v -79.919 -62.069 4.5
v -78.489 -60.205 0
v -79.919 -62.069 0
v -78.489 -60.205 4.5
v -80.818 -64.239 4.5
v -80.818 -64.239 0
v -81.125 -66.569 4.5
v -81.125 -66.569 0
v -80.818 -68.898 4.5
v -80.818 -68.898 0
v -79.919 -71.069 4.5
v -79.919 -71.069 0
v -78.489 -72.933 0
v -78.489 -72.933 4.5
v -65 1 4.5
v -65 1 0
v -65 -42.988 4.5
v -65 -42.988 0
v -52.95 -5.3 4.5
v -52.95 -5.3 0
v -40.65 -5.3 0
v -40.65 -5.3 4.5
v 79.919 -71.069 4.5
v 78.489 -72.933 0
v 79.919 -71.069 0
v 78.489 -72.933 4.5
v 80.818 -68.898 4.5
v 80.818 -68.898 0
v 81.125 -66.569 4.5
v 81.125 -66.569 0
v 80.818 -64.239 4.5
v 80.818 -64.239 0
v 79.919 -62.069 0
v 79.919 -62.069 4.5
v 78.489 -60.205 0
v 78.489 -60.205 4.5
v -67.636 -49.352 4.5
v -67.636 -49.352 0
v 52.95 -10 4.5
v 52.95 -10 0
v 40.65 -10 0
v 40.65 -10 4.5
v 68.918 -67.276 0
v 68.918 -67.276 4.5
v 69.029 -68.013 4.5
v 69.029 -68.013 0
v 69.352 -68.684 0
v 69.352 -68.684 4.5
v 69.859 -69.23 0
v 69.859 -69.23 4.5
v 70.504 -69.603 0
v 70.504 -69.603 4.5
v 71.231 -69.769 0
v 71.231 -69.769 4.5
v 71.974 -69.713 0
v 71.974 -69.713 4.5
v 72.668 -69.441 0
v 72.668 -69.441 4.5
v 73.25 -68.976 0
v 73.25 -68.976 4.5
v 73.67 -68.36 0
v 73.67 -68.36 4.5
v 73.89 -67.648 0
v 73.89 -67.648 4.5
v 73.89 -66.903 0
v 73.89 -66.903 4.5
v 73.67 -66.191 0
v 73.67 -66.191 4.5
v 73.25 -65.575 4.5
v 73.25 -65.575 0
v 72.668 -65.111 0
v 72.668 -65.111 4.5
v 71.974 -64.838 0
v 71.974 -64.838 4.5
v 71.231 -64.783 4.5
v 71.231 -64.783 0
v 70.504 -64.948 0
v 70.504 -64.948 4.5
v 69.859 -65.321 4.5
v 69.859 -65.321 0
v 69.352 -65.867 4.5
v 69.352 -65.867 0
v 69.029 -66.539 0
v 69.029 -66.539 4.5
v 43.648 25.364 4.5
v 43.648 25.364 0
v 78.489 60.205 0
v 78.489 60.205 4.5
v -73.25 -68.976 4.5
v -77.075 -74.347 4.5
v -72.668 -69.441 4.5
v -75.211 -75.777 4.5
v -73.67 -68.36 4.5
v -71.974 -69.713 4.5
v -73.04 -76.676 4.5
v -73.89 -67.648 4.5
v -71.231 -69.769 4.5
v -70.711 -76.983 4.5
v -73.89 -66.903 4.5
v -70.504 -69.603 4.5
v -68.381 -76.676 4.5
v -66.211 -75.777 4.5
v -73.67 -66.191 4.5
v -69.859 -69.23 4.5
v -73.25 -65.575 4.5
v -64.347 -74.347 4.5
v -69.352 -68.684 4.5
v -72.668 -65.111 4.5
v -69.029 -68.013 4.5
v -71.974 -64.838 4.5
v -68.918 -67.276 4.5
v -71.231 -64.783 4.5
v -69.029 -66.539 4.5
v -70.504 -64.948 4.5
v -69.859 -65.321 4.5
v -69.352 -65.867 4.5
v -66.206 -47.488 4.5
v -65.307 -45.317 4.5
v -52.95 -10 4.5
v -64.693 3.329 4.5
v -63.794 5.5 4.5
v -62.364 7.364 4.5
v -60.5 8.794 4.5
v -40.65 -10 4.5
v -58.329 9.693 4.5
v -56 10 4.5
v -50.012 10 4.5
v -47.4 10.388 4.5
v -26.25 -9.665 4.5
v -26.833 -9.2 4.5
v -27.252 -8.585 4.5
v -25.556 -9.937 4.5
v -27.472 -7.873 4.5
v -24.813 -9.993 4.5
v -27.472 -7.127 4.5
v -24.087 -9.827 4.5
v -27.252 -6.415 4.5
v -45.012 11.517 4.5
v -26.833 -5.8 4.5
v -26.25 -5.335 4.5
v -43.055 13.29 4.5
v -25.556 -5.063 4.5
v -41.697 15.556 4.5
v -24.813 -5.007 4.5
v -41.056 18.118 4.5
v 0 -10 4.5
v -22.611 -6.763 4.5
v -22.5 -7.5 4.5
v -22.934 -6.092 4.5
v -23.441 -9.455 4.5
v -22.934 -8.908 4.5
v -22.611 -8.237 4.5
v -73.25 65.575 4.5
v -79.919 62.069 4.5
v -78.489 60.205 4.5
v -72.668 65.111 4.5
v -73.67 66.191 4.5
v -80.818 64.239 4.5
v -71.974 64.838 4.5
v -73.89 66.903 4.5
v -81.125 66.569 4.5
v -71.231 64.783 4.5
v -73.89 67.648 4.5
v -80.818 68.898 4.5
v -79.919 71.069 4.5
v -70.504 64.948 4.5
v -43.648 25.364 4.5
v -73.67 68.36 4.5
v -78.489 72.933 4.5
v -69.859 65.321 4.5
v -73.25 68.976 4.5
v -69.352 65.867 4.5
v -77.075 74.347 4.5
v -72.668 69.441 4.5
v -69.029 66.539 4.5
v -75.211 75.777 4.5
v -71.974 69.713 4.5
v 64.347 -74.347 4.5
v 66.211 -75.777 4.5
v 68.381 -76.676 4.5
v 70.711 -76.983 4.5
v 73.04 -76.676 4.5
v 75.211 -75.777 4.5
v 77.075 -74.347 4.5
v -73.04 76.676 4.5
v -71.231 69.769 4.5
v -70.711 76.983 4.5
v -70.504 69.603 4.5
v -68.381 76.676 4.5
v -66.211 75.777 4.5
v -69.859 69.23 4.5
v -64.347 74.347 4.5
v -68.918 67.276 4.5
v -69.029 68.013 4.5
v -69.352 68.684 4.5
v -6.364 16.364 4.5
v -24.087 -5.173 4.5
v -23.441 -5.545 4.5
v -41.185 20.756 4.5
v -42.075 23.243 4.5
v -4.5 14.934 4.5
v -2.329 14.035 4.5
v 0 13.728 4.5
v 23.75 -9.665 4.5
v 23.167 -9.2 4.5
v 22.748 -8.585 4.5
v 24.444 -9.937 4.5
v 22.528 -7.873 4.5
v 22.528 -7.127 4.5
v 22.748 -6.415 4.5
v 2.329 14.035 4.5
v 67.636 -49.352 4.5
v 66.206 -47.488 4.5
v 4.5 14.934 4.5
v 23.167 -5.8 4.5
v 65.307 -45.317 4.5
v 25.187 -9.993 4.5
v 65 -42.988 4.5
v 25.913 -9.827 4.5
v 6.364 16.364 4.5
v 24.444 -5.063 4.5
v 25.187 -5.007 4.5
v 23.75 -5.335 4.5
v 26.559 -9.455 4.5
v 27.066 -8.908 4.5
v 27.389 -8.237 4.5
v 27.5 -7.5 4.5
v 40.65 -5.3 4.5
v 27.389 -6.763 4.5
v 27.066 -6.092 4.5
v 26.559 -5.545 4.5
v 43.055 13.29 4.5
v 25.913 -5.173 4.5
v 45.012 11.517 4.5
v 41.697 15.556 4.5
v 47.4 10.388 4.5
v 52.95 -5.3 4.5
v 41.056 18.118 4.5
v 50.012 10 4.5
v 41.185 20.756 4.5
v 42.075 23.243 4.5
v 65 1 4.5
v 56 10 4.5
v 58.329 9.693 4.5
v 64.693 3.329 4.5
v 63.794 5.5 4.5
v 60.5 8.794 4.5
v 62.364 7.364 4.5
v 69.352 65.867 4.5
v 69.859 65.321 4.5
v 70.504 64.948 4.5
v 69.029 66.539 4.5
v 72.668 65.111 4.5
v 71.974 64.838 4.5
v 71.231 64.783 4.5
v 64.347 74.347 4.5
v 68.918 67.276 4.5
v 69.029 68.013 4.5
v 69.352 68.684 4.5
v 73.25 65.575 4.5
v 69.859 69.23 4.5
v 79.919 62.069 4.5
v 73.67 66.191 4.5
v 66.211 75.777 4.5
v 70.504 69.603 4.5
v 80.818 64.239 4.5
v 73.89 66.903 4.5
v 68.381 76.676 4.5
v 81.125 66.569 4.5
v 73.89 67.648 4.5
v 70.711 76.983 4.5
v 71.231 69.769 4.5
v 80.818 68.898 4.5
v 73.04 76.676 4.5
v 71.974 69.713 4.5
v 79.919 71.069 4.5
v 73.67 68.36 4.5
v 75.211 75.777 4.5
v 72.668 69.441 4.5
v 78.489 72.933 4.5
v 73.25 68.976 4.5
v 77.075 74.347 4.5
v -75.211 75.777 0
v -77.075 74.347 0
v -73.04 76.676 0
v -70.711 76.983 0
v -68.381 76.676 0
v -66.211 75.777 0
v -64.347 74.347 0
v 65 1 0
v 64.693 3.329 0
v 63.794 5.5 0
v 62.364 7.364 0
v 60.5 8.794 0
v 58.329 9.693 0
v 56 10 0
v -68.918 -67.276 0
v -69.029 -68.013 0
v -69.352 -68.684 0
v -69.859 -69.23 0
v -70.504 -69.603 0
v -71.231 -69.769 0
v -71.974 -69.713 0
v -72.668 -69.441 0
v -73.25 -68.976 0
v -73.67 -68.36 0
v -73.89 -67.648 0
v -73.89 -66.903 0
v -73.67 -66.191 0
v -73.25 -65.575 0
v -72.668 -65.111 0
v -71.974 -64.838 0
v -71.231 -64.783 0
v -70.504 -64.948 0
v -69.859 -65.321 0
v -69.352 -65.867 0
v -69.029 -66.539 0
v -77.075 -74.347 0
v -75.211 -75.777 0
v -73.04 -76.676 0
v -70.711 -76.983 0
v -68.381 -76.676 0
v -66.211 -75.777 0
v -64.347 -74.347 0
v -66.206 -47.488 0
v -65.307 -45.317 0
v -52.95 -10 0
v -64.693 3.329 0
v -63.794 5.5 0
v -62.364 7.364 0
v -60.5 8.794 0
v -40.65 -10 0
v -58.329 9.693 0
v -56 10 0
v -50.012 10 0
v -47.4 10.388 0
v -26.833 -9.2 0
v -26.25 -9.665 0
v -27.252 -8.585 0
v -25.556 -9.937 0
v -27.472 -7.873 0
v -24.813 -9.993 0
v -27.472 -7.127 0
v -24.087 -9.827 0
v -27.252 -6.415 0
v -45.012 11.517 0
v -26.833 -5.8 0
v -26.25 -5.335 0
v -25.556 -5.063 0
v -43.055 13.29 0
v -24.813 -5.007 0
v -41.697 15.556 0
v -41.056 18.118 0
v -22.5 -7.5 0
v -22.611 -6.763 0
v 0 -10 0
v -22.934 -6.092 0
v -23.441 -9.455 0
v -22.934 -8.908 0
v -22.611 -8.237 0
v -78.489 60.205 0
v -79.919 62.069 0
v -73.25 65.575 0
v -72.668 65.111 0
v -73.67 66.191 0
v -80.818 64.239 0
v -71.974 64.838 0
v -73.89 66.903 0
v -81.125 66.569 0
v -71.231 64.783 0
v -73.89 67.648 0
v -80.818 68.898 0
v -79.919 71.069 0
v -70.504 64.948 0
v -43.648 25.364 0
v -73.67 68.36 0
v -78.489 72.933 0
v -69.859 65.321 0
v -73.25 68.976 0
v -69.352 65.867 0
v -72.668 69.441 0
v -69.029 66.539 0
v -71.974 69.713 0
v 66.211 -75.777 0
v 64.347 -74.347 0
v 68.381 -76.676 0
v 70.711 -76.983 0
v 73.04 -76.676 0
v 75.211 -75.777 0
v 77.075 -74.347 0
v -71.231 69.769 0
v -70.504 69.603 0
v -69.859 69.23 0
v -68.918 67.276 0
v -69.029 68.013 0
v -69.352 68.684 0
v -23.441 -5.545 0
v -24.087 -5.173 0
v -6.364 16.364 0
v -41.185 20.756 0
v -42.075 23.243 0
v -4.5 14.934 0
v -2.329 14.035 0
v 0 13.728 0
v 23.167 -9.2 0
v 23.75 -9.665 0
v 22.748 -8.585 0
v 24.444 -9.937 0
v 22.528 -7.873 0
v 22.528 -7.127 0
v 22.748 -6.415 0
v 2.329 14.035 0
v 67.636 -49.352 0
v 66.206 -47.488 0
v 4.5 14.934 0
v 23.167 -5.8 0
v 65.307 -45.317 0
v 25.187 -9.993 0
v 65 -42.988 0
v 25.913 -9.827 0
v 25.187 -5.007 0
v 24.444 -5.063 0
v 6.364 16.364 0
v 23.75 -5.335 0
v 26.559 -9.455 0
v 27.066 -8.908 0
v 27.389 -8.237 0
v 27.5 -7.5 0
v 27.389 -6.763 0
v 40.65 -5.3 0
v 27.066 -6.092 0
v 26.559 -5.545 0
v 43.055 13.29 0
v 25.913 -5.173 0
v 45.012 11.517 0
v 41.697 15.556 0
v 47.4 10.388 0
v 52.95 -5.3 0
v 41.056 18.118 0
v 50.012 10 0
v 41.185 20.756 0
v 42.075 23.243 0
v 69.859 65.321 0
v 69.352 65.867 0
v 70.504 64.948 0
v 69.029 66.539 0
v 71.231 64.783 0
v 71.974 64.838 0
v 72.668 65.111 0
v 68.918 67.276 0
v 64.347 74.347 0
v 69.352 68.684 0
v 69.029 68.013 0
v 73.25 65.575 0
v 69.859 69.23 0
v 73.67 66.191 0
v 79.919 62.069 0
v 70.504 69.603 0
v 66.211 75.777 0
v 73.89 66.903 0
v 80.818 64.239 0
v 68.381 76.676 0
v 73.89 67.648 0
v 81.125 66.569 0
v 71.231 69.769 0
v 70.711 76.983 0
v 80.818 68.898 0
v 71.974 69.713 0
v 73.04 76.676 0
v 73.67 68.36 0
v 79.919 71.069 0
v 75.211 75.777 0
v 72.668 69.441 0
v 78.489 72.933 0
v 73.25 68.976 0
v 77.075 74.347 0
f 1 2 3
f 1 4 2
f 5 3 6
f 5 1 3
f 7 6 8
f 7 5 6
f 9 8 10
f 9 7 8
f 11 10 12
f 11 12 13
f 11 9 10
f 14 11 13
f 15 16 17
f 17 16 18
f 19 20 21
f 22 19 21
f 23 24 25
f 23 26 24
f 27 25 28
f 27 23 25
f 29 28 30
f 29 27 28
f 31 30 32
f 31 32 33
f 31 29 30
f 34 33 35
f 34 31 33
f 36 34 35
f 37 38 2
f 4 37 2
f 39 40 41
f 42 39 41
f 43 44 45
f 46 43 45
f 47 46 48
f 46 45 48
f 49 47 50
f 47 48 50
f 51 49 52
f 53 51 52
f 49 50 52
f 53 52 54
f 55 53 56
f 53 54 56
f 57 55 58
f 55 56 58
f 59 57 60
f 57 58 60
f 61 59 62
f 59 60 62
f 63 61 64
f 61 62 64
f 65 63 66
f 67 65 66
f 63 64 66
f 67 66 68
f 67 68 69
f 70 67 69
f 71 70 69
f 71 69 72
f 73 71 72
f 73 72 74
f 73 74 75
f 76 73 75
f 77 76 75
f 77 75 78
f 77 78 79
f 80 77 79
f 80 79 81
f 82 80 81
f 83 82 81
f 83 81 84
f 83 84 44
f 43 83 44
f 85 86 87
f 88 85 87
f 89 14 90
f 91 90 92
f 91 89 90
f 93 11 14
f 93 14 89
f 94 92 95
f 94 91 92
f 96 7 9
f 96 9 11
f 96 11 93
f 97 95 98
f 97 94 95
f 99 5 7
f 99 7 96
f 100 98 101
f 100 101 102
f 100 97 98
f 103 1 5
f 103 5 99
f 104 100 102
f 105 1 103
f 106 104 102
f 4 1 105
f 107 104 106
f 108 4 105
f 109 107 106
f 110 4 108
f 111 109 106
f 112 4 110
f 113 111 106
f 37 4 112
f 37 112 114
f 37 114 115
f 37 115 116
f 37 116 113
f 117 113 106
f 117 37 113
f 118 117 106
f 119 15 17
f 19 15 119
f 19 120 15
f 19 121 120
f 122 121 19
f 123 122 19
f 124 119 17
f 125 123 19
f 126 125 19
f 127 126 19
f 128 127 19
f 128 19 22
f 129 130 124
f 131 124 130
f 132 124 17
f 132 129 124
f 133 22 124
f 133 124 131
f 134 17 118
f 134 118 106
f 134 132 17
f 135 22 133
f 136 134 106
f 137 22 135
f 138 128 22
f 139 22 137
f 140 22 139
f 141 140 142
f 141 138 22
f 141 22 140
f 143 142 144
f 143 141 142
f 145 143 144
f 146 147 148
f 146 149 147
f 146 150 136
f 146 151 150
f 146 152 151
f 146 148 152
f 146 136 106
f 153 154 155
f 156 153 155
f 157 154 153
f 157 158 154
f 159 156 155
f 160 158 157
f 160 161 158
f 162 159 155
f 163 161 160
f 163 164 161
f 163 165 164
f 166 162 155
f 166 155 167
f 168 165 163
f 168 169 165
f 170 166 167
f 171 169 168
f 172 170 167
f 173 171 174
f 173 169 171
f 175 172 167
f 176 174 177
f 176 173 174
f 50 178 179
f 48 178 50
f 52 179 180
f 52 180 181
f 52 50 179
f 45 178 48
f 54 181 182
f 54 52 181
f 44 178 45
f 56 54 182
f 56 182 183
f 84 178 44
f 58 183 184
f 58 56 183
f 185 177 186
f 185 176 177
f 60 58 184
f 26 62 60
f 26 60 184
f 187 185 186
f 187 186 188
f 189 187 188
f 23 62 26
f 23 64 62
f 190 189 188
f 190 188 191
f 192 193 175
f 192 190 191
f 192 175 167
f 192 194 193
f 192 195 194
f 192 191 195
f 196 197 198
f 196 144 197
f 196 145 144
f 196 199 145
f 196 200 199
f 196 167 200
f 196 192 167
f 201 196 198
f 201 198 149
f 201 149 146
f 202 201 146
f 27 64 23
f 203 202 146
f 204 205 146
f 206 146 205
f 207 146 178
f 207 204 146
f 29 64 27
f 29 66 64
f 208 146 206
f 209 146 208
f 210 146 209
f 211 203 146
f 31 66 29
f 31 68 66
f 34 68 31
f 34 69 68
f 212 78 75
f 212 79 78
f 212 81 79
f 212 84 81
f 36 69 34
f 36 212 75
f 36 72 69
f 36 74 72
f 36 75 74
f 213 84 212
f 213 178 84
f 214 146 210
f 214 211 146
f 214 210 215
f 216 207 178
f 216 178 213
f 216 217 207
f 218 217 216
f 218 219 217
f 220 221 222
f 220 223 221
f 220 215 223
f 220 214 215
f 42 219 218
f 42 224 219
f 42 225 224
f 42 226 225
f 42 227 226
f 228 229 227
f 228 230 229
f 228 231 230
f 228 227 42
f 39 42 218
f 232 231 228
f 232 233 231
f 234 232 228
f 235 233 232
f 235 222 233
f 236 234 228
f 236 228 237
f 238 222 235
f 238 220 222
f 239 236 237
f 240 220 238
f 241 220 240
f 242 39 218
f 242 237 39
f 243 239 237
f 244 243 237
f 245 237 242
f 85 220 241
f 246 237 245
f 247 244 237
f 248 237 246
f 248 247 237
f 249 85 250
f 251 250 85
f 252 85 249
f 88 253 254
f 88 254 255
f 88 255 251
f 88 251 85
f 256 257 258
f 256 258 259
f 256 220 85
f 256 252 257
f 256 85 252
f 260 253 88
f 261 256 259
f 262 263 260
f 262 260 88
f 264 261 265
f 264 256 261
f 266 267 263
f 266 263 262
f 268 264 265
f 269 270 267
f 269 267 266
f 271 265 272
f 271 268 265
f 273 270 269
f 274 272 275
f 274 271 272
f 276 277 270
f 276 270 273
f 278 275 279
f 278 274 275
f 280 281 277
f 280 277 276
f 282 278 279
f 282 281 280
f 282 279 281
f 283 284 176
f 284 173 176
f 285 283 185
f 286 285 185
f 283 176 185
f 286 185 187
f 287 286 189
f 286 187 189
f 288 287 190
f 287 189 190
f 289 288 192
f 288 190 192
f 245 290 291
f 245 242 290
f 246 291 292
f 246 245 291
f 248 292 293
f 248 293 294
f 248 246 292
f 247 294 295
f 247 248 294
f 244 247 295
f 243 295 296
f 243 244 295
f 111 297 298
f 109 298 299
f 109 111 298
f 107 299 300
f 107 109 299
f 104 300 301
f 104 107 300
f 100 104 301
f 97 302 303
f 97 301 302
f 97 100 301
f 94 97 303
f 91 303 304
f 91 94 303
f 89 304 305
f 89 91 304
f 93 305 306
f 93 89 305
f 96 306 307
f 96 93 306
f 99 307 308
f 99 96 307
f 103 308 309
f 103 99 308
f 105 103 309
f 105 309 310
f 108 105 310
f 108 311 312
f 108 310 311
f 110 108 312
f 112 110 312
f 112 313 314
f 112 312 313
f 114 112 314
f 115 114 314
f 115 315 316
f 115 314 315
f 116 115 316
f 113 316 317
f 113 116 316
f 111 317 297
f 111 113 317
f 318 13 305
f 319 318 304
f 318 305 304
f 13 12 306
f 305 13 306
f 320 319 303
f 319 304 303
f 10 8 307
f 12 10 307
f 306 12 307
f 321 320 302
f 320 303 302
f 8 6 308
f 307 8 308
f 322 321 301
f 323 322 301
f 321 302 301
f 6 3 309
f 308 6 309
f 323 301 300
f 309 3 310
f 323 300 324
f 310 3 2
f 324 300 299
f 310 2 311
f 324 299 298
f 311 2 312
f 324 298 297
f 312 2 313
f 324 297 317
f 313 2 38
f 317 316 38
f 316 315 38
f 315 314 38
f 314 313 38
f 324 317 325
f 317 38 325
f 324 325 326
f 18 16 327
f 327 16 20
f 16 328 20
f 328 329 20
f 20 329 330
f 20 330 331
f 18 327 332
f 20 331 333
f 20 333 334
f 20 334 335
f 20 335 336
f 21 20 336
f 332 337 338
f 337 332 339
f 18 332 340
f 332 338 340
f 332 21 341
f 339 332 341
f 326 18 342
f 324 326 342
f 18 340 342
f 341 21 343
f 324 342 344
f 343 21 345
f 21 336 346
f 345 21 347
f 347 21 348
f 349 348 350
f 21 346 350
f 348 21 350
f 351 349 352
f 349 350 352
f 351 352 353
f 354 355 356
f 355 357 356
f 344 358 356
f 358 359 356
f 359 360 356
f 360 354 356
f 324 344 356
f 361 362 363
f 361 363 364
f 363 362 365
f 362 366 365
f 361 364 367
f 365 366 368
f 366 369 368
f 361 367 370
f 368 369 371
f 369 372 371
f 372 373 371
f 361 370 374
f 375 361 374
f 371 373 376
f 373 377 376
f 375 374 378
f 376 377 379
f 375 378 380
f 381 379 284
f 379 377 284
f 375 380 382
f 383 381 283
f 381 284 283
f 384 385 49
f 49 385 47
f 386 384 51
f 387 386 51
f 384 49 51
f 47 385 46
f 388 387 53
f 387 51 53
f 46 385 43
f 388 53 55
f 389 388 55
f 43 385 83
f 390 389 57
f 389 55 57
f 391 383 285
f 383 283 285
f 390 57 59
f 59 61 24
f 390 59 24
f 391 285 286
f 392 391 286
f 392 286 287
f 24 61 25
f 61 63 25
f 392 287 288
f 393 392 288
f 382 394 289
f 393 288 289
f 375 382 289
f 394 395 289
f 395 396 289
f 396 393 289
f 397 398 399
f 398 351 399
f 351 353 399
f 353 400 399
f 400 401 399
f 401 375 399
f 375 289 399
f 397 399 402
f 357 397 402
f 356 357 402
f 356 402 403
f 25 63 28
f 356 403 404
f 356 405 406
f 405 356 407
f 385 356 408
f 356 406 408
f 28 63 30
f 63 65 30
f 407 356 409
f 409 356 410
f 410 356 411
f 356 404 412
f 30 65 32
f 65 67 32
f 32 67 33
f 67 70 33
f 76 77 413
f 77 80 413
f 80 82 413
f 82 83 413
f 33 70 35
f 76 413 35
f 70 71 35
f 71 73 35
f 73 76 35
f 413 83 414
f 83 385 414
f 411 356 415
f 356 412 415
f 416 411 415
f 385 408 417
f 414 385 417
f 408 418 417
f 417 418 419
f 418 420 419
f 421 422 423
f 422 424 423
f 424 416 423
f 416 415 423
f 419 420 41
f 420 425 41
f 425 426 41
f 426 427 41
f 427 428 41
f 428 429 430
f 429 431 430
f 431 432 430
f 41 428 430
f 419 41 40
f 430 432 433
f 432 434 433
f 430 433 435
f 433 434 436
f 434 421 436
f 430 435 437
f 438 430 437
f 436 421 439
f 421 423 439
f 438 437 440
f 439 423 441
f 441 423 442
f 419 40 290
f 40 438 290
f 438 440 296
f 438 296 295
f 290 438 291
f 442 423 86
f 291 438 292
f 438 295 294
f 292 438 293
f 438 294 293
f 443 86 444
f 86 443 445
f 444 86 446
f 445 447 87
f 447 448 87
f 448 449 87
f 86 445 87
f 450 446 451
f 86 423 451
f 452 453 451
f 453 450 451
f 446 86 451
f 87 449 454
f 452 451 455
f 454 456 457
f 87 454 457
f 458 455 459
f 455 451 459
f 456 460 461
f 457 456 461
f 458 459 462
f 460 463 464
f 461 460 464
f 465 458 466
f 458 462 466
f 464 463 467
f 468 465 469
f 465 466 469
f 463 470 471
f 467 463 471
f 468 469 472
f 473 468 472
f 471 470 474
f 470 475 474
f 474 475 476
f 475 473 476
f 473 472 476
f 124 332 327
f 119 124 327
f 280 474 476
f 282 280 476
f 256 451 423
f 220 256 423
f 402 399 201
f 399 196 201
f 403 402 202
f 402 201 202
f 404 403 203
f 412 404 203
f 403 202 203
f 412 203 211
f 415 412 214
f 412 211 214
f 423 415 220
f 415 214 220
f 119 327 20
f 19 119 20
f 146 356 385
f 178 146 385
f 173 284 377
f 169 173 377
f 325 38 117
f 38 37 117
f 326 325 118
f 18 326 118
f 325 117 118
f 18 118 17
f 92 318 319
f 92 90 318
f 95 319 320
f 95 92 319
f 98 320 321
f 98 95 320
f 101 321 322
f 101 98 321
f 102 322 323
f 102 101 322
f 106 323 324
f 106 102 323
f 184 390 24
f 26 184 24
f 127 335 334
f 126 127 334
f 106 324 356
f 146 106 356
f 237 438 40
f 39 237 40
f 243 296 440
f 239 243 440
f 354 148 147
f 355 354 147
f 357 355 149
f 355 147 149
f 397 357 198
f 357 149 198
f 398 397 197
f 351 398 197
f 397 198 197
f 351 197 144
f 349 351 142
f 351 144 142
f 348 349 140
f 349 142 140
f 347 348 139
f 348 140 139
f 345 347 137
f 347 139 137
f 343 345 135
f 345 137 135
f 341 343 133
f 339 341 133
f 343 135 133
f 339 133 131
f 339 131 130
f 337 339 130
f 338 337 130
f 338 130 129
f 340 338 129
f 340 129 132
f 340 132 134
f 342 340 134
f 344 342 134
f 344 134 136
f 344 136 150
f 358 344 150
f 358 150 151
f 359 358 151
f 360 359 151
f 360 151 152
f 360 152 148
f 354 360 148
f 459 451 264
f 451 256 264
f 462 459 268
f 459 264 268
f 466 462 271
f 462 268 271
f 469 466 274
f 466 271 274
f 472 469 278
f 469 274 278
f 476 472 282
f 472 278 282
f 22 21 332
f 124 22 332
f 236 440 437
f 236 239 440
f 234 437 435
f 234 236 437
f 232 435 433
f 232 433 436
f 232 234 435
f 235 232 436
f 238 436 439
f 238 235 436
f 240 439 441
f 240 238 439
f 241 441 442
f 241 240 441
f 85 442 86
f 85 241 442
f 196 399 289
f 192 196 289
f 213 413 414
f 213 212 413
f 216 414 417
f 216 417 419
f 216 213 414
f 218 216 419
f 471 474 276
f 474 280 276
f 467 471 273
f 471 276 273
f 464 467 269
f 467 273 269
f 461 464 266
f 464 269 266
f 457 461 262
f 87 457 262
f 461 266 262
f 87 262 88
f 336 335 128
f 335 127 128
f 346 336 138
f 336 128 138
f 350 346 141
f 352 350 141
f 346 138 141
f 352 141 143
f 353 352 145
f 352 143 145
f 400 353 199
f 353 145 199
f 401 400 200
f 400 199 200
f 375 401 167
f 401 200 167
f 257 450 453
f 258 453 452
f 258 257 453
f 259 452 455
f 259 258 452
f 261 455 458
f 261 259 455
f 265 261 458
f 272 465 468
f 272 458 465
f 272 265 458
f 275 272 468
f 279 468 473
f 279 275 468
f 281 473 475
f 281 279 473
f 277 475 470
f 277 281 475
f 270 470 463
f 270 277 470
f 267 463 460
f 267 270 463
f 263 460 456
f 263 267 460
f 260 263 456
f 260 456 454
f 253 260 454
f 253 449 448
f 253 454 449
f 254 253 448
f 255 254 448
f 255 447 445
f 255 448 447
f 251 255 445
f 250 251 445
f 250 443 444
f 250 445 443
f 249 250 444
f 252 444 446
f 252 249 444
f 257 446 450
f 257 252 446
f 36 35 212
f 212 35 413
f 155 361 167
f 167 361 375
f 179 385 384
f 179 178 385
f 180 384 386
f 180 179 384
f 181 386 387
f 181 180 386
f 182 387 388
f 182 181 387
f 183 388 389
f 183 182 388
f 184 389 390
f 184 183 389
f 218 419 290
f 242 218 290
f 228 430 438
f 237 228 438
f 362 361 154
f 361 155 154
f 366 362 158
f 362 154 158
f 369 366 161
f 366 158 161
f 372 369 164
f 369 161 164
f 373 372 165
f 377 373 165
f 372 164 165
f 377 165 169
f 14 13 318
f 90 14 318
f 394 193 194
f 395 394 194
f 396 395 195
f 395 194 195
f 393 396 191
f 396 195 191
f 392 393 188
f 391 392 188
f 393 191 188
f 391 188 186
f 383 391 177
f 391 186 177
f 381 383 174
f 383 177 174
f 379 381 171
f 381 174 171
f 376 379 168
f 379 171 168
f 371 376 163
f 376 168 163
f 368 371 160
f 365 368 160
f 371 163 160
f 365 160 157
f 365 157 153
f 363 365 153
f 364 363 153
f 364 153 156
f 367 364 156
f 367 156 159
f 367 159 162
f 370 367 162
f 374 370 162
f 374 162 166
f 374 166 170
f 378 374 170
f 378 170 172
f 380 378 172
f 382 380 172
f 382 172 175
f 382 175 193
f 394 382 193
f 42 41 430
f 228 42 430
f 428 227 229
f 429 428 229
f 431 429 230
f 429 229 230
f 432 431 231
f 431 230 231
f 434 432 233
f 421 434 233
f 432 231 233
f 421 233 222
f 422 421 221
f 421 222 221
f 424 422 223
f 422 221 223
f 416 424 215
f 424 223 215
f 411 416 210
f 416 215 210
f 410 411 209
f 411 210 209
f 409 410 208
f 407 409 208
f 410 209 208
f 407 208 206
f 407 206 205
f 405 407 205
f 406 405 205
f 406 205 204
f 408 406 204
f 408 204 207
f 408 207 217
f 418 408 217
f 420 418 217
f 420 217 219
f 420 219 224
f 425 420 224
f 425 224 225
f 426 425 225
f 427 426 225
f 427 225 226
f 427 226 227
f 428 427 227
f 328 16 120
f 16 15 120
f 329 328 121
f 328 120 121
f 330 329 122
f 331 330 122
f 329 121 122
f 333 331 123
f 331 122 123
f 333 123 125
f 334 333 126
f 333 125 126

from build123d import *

# Parameters (mm, degrees)
BOSS_EXTRUDE1_DEPTH     = 4.5
SKETCH3_R               = 2.5
CUT_EXTRUDE3_DEPTH      = 118.194127679
FILLET1_R               = 9
FILLET2_R               = 9
SKETCH5_R               = 2.5
CUT_EXTRUDE4_DEPTH      = 112.927846314
MIRROR2_COPY_1_SKETCH_R = 2.5
MIRROR2_COPY_1_DEPTH    = 112.927846314


with BuildPart() as part:
    # Sketch1 → Boss-Extrude1 (new body)
    with BuildSketch(Plane.XY):
        Polygon((-28.284271247, -10), (-6.15, -10), (-6.15, -5.3), (6.15, -5.3), (6.15, -10), (28.284271247, -10), (40.65, -10), (40.65, -5.3), (52.95, -5.3), (52.95, -10), (65, -10), (65, 10), (28.284271247, 10), (0, 10), (-28.284271247, 10), (-65, 10), (-65, -10), (-52.95, -10), (-52.95, -5.3), (-40.65, -5.3), (-40.65, -10), align=None)
        Polygon((-70.710678119, -80.710678119), (0, -10), (-6.15, -10), (-28.284271247, -10), (-65, -46.715728753), (-84.852813742, -66.568542495), align=None)
        Polygon((6.15, -10), (0, -10), (70.710678119, -80.710678119), (84.852813742, -66.568542495), (65, -46.715728753), (28.284271247, -10), align=None)
        Polygon((0, 10), (28.284271247, 10), (84.852813742, 66.568542495), (70.710678119, 80.710678119), align=None)
        Polygon((-84.852813742, 66.568542495), (-28.284271247, 10), (0, 10), (-70.710678119, 80.710678119), align=None)
        Polygon((-6.15, -10), (0, -10), (6.15, -10), (6.15, -5.3), (-6.15, -5.3), align=None)
        Polygon((-65, -46.715728753), (-28.284271247, -10), (-40.65, -10), (-52.95, -10), (-65, -10), align=None)
        Polygon((40.65, -10), (28.284271247, -10), (65, -46.715728753), (65, -10), (52.95, -10), align=None)
    extrude(amount=BOSS_EXTRUDE1_DEPTH)

    # Sketch3 → Cut-Extrude3 (cut, through all)
    with BuildSketch(Plane.XY.offset(4.5)):
        with Locations((-25, -7.5)):
            Circle(SKETCH3_R)
        with Locations((25, -7.5)):
            Circle(SKETCH3_R)
    extrude(amount=-CUT_EXTRUDE3_DEPTH, mode=Mode.SUBTRACT)

    # Fillet1
    fillet1_edges = [part.edges().sort_by_distance(p)[0] for p in [
        (-65, -46.715728753, 2.25),
        (-65, 10, 2.25),
        (-28.284271247, 10, 2.25),
        (0, 10, 2.25),
        (28.284271247, 10, 2.25),
        (65, 10, 2.25),
        (65, -46.715728753, 2.25),
    ]]
    fillet(fillet1_edges, radius=FILLET1_R)

    # Fillet2
    fillet2_edges = [part.edges().sort_by_distance(p)[0] for p in [
        (-70.710678119, -80.710678119, 2.25),
        (-84.852813742, -66.568542495, 2.25),
        (-84.852813742, 66.568542495, 2.25),
        (-70.710678119, 80.710678119, 2.25),
        (70.710678119, 80.710678119, 2.25),
        (84.852813742, 66.568542495, 2.25),
        (84.852813742, -66.568542495, 2.25),
        (70.710678119, -80.710678119, 2.25),
    ]]
    fillet(fillet2_edges, radius=FILLET2_R)

    # Sketch5 → Cut-Extrude4 (cut, through all)
    with BuildSketch(Plane.XY.offset(4.5)):
        with Locations((-71.4177849, 67.275649276)):
            Circle(SKETCH5_R)
    cut_extrude4 = extrude(amount=-CUT_EXTRUDE4_DEPTH, mode=Mode.SUBTRACT)

    # Mirror1: Cut-Extrude4 across plane
    add(cut_extrude4.mirror(Plane(origin=(0, 0, 0), x_dir=(0, 0, 1), z_dir=(1, 0, 0))), mode=Mode.SUBTRACT)

    # Mirror2: Cut-Extrude4 across plane
    add(cut_extrude4.mirror(Plane.ZX), mode=Mode.SUBTRACT)

    # Mirror2 copy 1 sketch → Mirror2 copy 1 (cut, through all)
    with BuildSketch(Plane(origin=(0, 0, 4.5), x_dir=(-1, 0, 0), z_dir=(0, 0, 1))):
        with Locations((-71.4177849, 67.275649276)):
            Circle(MIRROR2_COPY_1_SKETCH_R)
    extrude(amount=-MIRROR2_COPY_1_DEPTH, mode=Mode.SUBTRACT)


solid = part.part
